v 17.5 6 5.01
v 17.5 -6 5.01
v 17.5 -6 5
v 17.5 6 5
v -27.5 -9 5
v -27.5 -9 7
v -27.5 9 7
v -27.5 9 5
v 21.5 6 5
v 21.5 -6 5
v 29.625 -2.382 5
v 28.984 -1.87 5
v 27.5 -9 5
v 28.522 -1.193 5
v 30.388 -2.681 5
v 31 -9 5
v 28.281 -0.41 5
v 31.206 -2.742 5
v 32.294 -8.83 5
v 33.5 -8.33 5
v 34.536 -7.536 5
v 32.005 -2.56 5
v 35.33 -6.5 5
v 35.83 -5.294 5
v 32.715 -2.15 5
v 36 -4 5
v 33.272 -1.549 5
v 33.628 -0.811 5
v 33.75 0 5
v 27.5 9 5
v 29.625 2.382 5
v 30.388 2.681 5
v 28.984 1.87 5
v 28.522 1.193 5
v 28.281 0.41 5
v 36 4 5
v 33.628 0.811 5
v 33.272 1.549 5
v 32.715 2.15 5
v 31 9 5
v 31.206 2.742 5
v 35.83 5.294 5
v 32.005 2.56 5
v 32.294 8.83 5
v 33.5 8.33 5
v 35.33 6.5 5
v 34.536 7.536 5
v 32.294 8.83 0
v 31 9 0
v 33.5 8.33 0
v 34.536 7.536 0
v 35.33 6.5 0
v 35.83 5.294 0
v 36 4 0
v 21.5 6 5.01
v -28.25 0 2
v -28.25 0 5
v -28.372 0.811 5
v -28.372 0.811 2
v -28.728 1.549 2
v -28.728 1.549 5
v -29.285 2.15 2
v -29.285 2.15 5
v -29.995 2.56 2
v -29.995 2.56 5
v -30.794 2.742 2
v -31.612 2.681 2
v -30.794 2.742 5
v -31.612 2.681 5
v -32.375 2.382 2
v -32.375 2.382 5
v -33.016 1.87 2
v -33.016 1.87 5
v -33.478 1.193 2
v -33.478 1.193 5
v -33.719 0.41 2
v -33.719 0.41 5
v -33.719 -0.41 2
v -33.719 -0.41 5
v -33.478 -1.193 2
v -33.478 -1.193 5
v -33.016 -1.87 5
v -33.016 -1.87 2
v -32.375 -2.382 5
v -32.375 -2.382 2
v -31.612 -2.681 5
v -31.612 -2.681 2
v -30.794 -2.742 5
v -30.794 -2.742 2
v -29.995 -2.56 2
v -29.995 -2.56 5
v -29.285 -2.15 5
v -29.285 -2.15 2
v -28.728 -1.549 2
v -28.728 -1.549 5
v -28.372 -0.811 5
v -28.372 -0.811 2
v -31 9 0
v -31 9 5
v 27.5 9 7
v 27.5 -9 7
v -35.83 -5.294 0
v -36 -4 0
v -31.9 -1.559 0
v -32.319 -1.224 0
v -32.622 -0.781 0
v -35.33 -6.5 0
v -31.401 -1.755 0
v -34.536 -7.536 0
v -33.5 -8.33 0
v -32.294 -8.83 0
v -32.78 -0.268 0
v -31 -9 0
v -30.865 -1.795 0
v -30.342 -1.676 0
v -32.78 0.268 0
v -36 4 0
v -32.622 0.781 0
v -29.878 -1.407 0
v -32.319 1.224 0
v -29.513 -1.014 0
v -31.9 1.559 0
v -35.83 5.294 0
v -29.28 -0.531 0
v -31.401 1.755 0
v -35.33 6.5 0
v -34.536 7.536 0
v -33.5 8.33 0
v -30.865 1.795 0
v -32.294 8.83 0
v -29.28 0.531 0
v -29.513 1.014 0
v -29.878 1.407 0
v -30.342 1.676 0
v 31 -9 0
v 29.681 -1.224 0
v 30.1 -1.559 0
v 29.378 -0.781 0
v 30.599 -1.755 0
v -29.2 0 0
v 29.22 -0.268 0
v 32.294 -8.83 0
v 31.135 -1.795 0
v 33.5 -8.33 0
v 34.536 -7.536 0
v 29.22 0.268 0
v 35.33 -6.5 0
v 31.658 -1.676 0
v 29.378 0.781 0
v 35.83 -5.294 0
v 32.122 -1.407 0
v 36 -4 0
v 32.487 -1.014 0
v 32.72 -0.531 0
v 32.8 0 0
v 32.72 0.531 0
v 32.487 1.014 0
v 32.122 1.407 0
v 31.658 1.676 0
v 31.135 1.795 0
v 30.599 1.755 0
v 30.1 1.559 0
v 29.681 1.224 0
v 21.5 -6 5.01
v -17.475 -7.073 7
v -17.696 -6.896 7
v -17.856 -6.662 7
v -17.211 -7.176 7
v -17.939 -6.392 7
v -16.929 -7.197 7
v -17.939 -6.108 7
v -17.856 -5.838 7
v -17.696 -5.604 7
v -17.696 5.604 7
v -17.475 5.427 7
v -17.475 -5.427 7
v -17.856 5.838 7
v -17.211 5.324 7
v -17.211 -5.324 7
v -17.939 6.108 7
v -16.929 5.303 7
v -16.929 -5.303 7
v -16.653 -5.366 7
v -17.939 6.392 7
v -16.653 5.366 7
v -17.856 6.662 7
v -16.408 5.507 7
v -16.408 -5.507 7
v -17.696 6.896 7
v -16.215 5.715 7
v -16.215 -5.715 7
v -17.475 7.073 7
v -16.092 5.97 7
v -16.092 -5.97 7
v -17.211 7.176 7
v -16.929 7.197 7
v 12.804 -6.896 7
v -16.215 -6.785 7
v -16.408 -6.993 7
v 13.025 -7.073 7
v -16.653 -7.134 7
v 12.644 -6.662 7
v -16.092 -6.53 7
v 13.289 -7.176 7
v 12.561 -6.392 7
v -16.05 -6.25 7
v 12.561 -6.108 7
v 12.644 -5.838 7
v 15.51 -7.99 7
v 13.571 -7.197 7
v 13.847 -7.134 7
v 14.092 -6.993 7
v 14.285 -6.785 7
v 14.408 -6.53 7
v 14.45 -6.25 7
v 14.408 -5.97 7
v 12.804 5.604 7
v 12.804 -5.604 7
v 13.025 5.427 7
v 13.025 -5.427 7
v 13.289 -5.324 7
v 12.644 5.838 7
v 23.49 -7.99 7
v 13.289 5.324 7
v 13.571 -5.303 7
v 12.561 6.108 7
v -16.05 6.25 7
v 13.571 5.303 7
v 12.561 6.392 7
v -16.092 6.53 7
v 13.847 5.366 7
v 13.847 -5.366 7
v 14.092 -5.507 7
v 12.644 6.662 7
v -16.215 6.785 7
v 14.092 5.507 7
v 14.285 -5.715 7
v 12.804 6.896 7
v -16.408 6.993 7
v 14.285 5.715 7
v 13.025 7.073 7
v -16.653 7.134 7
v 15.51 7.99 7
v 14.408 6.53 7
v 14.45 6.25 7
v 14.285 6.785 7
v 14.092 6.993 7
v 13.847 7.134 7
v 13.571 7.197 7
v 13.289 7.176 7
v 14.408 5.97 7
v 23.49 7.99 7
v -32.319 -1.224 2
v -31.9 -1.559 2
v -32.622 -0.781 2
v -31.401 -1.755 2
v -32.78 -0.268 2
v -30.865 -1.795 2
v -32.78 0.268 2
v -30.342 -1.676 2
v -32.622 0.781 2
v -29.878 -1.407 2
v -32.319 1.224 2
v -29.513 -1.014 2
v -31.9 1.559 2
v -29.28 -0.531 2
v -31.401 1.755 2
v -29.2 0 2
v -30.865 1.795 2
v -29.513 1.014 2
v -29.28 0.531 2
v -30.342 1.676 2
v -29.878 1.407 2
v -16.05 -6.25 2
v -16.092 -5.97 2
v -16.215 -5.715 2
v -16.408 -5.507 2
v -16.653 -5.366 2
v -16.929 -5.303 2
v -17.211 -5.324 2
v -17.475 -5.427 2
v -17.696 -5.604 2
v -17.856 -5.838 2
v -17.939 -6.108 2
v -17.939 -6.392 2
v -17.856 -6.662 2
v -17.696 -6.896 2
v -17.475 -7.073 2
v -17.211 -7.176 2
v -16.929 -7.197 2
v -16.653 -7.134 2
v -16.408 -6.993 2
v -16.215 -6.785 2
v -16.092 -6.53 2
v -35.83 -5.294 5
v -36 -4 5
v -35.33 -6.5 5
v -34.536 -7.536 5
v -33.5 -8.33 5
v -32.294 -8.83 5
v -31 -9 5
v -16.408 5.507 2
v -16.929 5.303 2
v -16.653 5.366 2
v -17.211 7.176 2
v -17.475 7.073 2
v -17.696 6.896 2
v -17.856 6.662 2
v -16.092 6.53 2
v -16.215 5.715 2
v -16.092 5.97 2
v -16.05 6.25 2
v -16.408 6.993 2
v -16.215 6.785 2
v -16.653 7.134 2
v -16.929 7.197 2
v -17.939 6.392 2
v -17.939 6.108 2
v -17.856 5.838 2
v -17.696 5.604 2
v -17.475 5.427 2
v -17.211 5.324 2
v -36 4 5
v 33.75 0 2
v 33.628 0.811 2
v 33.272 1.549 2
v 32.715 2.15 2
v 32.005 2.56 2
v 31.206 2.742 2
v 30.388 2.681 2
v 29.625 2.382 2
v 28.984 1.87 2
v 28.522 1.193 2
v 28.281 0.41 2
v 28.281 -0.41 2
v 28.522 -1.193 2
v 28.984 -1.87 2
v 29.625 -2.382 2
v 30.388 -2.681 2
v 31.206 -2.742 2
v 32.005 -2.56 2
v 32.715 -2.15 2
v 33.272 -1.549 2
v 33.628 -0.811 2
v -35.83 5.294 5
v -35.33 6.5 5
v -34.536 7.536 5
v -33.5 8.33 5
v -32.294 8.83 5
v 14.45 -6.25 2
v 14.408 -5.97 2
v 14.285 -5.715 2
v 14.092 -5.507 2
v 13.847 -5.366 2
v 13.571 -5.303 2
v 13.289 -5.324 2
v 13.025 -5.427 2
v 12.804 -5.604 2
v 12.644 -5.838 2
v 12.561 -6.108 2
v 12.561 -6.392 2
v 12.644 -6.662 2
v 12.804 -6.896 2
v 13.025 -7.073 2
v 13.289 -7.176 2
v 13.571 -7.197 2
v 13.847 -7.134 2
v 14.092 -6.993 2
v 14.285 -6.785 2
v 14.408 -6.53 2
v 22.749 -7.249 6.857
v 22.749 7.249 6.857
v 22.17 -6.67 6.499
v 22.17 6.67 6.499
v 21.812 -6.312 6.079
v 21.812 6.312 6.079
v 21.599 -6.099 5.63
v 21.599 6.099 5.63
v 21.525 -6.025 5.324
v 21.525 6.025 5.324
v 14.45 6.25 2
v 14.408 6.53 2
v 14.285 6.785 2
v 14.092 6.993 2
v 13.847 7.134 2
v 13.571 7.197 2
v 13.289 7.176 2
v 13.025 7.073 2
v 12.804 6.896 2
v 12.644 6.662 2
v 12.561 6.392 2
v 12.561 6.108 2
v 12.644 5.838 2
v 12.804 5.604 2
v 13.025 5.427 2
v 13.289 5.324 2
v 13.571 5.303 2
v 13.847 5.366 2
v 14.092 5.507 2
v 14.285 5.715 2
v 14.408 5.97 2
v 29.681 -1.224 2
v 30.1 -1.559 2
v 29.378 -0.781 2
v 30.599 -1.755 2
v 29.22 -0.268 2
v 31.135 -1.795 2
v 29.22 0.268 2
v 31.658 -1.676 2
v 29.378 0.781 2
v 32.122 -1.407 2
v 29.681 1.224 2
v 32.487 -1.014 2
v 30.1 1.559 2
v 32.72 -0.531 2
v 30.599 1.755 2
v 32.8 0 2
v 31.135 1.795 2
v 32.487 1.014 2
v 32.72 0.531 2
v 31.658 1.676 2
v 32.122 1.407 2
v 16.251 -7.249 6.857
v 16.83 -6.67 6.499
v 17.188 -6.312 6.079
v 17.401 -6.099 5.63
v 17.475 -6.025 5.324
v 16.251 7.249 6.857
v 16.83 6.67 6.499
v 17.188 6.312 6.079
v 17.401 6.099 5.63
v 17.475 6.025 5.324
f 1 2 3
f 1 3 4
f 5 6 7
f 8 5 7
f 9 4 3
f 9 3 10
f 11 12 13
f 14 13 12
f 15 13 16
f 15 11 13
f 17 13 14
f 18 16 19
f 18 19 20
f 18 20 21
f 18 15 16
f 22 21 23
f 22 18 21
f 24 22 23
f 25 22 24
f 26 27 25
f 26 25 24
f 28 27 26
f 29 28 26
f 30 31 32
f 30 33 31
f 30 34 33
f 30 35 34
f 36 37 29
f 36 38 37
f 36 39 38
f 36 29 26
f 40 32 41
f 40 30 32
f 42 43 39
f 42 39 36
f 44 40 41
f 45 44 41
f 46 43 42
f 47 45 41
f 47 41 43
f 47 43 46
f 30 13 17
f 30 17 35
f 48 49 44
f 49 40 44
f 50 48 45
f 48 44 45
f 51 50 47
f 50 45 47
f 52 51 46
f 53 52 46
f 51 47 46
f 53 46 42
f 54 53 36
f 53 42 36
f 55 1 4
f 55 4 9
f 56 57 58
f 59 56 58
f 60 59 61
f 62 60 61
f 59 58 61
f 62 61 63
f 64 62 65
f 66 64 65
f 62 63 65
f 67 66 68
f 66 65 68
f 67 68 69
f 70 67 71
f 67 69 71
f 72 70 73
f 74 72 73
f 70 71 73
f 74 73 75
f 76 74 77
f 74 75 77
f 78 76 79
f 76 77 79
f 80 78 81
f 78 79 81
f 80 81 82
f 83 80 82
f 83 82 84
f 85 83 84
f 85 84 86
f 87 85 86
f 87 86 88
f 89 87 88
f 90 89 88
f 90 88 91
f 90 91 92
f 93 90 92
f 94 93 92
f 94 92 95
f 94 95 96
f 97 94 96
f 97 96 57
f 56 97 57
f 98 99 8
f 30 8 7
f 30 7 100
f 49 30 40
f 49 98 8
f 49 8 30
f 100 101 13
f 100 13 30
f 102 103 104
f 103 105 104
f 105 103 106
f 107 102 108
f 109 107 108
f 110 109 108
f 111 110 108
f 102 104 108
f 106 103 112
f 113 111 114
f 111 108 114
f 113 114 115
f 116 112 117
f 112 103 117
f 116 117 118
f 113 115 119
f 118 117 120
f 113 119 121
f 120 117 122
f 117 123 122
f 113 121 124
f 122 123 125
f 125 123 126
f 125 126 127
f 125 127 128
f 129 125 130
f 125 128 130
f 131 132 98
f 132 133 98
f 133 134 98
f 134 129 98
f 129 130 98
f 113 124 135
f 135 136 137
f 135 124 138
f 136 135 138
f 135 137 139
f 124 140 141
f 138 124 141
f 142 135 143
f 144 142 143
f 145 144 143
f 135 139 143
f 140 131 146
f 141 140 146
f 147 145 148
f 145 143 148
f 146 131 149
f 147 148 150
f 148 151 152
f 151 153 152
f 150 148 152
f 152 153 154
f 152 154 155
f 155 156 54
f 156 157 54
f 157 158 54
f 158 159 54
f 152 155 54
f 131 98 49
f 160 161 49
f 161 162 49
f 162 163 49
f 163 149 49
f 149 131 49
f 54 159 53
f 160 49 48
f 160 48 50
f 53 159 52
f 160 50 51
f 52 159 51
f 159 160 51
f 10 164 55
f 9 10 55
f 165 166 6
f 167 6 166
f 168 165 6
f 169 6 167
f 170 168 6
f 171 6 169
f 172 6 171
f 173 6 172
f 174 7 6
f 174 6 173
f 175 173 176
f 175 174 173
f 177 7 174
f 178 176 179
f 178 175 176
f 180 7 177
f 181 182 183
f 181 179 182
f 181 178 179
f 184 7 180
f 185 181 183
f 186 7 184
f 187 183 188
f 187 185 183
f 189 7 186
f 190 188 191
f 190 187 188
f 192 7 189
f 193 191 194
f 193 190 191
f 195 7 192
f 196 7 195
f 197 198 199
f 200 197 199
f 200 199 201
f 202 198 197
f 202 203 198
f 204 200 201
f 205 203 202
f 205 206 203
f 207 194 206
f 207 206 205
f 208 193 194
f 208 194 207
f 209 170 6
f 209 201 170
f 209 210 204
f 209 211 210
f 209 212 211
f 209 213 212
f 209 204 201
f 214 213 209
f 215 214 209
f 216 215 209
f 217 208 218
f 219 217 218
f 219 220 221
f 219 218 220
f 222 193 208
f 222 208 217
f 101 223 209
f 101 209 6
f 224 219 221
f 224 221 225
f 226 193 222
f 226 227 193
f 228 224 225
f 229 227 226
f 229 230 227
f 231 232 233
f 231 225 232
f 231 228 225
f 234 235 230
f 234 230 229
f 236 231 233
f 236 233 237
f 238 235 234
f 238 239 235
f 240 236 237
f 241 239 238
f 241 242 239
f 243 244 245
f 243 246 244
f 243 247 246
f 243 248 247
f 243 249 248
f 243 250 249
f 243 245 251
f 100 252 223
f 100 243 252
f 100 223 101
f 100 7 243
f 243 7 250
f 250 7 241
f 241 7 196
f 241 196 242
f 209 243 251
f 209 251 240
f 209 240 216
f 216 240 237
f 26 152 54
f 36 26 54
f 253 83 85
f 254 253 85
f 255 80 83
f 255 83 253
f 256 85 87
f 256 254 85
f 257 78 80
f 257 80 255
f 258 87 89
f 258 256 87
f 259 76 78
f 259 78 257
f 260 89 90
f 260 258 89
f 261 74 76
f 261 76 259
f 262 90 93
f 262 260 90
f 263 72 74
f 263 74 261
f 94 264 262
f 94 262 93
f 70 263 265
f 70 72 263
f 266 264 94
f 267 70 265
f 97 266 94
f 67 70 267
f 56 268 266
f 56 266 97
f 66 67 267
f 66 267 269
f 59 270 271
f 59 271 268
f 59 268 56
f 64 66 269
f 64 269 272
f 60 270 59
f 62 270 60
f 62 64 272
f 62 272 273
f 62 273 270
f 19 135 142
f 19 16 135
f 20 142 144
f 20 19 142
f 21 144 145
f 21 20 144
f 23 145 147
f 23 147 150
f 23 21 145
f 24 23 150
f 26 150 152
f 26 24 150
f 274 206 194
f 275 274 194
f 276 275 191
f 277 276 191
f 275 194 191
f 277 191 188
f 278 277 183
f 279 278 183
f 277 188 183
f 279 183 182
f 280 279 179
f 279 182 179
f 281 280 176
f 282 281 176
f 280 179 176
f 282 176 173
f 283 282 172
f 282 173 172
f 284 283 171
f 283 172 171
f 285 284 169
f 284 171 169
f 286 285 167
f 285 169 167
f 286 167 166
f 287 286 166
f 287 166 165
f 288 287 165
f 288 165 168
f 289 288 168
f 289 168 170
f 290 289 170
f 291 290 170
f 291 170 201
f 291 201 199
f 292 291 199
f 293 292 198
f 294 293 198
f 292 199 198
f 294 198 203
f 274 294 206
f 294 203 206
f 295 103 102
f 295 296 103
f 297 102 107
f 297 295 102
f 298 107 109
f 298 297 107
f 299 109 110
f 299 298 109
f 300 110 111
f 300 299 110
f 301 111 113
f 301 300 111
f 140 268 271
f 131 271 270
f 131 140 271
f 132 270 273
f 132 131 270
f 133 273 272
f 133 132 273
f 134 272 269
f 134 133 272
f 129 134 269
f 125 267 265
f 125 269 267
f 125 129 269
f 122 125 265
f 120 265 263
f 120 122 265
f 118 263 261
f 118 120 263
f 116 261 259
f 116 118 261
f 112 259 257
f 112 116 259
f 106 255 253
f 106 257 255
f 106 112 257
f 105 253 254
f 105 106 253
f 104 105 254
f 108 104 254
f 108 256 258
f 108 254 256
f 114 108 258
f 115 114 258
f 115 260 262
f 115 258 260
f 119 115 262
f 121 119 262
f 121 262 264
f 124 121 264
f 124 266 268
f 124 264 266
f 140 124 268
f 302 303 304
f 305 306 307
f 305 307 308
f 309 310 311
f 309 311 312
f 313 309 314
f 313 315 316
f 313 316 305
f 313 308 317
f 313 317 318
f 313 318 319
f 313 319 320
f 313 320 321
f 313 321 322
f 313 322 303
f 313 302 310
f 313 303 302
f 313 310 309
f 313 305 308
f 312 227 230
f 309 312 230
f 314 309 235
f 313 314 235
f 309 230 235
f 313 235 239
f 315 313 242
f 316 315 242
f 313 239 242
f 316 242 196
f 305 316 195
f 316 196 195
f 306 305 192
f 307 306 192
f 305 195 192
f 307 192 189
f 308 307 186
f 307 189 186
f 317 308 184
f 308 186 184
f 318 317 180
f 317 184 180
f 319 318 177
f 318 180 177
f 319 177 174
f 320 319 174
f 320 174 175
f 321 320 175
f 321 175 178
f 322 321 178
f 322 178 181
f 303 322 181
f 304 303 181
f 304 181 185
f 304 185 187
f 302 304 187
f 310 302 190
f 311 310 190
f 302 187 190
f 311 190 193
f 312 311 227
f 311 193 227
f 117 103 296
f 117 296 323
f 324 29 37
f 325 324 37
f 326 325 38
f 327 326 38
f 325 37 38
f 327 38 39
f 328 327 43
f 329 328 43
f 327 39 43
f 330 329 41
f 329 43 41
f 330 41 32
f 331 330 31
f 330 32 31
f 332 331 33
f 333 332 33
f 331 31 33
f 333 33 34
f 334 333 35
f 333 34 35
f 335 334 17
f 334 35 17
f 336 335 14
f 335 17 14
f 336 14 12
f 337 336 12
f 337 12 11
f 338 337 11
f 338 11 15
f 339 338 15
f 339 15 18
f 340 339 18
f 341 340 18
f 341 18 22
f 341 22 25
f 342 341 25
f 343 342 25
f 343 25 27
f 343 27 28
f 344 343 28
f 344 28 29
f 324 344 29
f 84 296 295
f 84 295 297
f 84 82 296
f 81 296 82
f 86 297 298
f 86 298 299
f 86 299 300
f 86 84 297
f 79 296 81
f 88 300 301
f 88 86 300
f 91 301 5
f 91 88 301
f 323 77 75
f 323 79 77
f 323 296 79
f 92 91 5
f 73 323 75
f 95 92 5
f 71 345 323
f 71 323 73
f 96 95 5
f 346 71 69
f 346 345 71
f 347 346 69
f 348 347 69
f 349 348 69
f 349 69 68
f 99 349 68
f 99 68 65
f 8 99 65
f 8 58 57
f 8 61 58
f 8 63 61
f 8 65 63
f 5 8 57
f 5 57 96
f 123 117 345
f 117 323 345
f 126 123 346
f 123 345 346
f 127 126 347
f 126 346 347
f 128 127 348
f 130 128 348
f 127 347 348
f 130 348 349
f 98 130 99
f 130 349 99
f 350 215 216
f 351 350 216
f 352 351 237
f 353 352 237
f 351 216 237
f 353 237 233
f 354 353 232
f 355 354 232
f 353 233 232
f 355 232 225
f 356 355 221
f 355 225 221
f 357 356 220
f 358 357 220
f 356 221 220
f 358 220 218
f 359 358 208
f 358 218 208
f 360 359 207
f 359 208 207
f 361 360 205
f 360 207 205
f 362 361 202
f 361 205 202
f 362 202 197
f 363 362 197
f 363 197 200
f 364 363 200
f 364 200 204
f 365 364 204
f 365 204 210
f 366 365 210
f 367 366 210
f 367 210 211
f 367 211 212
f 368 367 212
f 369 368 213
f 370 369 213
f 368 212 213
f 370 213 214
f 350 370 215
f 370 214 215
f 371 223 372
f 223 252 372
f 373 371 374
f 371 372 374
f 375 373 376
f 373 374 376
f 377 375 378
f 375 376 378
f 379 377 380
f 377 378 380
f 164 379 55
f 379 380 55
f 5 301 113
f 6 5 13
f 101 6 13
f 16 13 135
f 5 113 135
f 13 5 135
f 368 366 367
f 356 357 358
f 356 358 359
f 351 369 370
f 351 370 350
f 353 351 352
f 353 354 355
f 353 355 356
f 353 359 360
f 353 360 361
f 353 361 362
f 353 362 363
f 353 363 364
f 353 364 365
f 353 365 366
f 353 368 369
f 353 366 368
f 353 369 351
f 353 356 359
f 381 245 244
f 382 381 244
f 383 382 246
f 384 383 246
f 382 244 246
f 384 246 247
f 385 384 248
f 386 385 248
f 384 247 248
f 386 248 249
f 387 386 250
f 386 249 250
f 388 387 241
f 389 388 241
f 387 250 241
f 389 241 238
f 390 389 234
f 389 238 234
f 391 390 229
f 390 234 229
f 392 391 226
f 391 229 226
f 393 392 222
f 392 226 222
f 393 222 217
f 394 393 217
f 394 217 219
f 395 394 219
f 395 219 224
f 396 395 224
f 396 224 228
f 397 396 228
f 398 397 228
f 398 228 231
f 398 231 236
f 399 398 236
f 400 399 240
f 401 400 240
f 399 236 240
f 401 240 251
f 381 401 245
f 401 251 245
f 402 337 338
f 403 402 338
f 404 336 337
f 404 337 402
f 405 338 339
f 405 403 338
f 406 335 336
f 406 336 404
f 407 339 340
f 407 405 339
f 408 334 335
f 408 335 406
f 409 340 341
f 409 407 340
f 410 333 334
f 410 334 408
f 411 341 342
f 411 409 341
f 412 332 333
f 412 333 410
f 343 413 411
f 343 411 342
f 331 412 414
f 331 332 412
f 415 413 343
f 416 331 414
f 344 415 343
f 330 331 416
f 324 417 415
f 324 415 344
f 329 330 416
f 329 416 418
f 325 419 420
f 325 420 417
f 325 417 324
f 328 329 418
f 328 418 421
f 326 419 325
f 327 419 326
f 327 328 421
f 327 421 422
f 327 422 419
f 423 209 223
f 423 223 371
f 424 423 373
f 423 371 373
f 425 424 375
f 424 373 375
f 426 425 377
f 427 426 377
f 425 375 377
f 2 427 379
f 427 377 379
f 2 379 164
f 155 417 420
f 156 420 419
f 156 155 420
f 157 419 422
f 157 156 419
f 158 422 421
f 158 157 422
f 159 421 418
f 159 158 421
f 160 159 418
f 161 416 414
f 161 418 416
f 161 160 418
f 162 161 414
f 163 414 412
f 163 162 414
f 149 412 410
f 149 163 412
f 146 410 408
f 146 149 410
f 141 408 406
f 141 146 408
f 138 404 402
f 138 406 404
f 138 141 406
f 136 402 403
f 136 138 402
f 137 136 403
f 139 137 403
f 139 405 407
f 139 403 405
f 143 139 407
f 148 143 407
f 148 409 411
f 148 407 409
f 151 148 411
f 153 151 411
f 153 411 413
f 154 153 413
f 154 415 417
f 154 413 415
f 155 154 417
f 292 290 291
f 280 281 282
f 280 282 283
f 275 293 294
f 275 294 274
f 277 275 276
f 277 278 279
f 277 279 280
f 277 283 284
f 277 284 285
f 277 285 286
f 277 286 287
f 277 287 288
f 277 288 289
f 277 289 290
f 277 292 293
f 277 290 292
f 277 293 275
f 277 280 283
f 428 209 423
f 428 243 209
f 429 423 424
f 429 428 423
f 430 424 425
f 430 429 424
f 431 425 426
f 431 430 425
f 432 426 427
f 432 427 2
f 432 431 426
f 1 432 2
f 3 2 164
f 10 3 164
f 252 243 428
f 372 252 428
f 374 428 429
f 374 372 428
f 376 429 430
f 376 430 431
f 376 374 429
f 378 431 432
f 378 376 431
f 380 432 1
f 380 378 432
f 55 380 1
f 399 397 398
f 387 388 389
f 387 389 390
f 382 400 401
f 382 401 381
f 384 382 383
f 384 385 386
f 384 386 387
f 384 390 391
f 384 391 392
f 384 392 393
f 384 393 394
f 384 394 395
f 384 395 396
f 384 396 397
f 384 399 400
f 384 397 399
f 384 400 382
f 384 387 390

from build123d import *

# Parameters (mm, degrees)
SKETCH_W        = 72
SKETCH_H        = 18
SKETCH_R        = 1.8
PAD_DEPTH       = 7
SKETCH001_R     = 2.75
POCKET_DEPTH    = 5
SKETCH002_W     = 8.5
SKETCH002_H     = 18
SKETCH002_W_2   = 4
SKETCH002_H_2   = 12
POCKET001_DEPTH = 2
SKETCH003_R     = 0.95
POCKET002_DEPTH = 5
FILLET_R        = 5
FILLET001_R     = 1.99


with BuildPart() as part:
    # Sketch → Pad (new body)
    with BuildSketch(Plane.XY):
        Rectangle(SKETCH_W, SKETCH_H)
        with Locations((-31, 0)):
            Circle(SKETCH_R, mode=Mode.SUBTRACT)
        with Locations((31, 0)):
            Circle(SKETCH_R, mode=Mode.SUBTRACT)
    extrude(amount=PAD_DEPTH)

    # Sketch001 (on Face8 of Pad) → Pocket (cut)
    with BuildSketch(Plane.XY.offset(7)):
        with Locations((-31, 0)):
            Circle(SKETCH001_R)
        with Locations((31, 0)):
            Circle(SKETCH001_R)
    extrude(amount=-POCKET_DEPTH, mode=Mode.SUBTRACT)

    # Sketch002 (on Face5 of Pocket) → Pocket001 (cut)
    with BuildSketch(Plane.XY.offset(7)):
        with Locations((-31.75, 0)):
            Rectangle(SKETCH002_W, SKETCH002_H)
        with Locations((31.75, 0)):
            Rectangle(SKETCH002_W, SKETCH002_H)
        with Locations((19.5, 0)):
            Rectangle(SKETCH002_W_2, SKETCH002_H_2)
    extrude(amount=-POCKET001_DEPTH, mode=Mode.SUBTRACT)

    # Sketch003 (on Face11 of Pocket001) → Pocket002 (cut)
    with BuildSketch(Plane.XY.offset(7)):
        with Locations((-17, 6.25)):
            Circle(SKETCH003_R)
        with Locations((-17, -6.25)):
            Circle(SKETCH003_R)
        with Locations((13.5, 6.25)):
            Circle(SKETCH003_R)
        with Locations((13.5, -6.25)):
            Circle(SKETCH003_R)
    extrude(amount=-POCKET002_DEPTH, mode=Mode.SUBTRACT)

    # Fillet
    fillet_edges = [part.edges().sort_by_distance(p)[0] for p in [
        (-36, -9, 2.5),
        (-36, 9, 2.5),
        (36, -9, 2.5),
        (36, 9, 2.5),
    ]]
    fillet(fillet_edges, radius=FILLET_R)

    # Fillet001
    fillet001_edges = [part.edges().sort_by_distance(p)[0] for p in [
        (21.5, 0, 7),
        (19.5, 6, 7),
        (17.5, 0, 7),
        (19.5, -6, 7),
    ]]
    fillet(fillet001_edges, radius=FILLET001_R)


solid = part.part
